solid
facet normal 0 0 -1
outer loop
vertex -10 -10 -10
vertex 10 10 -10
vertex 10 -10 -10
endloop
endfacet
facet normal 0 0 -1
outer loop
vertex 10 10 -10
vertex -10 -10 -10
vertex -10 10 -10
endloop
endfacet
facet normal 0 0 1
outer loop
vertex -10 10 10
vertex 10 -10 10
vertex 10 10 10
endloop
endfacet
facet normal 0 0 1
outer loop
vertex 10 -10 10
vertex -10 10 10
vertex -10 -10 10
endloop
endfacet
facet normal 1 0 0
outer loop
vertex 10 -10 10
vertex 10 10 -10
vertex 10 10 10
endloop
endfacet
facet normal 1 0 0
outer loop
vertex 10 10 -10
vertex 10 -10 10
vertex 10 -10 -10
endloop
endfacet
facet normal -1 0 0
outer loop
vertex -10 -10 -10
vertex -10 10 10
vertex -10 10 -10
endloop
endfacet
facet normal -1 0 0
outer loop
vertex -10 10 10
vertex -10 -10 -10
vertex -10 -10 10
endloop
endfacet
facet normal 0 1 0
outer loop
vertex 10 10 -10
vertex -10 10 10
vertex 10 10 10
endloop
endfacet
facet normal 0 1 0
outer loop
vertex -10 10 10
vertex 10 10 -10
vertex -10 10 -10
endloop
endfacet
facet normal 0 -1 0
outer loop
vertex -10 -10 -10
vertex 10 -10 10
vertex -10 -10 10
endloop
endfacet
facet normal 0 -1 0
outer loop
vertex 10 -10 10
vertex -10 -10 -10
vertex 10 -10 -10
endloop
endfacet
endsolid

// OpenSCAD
// Define the dimensions of the yellow ball
diameter = 20;

// Define the dimensions of the yellow block
length = 20;
width = 20;
height = 20;

// Create the yellow ball
cylinder(d=diameter, h=diameter, $fn=20, center=true);

// Create the yellow block
cube(size=[length, width, height], center=true);

// Position the yellow ball on top of the yellow block
translate([(length - diameter), (width - diameter) / 2, (height - diameter) / 2])
cylinder(d=diameter, h=diameter, $fn=20, center=true);
